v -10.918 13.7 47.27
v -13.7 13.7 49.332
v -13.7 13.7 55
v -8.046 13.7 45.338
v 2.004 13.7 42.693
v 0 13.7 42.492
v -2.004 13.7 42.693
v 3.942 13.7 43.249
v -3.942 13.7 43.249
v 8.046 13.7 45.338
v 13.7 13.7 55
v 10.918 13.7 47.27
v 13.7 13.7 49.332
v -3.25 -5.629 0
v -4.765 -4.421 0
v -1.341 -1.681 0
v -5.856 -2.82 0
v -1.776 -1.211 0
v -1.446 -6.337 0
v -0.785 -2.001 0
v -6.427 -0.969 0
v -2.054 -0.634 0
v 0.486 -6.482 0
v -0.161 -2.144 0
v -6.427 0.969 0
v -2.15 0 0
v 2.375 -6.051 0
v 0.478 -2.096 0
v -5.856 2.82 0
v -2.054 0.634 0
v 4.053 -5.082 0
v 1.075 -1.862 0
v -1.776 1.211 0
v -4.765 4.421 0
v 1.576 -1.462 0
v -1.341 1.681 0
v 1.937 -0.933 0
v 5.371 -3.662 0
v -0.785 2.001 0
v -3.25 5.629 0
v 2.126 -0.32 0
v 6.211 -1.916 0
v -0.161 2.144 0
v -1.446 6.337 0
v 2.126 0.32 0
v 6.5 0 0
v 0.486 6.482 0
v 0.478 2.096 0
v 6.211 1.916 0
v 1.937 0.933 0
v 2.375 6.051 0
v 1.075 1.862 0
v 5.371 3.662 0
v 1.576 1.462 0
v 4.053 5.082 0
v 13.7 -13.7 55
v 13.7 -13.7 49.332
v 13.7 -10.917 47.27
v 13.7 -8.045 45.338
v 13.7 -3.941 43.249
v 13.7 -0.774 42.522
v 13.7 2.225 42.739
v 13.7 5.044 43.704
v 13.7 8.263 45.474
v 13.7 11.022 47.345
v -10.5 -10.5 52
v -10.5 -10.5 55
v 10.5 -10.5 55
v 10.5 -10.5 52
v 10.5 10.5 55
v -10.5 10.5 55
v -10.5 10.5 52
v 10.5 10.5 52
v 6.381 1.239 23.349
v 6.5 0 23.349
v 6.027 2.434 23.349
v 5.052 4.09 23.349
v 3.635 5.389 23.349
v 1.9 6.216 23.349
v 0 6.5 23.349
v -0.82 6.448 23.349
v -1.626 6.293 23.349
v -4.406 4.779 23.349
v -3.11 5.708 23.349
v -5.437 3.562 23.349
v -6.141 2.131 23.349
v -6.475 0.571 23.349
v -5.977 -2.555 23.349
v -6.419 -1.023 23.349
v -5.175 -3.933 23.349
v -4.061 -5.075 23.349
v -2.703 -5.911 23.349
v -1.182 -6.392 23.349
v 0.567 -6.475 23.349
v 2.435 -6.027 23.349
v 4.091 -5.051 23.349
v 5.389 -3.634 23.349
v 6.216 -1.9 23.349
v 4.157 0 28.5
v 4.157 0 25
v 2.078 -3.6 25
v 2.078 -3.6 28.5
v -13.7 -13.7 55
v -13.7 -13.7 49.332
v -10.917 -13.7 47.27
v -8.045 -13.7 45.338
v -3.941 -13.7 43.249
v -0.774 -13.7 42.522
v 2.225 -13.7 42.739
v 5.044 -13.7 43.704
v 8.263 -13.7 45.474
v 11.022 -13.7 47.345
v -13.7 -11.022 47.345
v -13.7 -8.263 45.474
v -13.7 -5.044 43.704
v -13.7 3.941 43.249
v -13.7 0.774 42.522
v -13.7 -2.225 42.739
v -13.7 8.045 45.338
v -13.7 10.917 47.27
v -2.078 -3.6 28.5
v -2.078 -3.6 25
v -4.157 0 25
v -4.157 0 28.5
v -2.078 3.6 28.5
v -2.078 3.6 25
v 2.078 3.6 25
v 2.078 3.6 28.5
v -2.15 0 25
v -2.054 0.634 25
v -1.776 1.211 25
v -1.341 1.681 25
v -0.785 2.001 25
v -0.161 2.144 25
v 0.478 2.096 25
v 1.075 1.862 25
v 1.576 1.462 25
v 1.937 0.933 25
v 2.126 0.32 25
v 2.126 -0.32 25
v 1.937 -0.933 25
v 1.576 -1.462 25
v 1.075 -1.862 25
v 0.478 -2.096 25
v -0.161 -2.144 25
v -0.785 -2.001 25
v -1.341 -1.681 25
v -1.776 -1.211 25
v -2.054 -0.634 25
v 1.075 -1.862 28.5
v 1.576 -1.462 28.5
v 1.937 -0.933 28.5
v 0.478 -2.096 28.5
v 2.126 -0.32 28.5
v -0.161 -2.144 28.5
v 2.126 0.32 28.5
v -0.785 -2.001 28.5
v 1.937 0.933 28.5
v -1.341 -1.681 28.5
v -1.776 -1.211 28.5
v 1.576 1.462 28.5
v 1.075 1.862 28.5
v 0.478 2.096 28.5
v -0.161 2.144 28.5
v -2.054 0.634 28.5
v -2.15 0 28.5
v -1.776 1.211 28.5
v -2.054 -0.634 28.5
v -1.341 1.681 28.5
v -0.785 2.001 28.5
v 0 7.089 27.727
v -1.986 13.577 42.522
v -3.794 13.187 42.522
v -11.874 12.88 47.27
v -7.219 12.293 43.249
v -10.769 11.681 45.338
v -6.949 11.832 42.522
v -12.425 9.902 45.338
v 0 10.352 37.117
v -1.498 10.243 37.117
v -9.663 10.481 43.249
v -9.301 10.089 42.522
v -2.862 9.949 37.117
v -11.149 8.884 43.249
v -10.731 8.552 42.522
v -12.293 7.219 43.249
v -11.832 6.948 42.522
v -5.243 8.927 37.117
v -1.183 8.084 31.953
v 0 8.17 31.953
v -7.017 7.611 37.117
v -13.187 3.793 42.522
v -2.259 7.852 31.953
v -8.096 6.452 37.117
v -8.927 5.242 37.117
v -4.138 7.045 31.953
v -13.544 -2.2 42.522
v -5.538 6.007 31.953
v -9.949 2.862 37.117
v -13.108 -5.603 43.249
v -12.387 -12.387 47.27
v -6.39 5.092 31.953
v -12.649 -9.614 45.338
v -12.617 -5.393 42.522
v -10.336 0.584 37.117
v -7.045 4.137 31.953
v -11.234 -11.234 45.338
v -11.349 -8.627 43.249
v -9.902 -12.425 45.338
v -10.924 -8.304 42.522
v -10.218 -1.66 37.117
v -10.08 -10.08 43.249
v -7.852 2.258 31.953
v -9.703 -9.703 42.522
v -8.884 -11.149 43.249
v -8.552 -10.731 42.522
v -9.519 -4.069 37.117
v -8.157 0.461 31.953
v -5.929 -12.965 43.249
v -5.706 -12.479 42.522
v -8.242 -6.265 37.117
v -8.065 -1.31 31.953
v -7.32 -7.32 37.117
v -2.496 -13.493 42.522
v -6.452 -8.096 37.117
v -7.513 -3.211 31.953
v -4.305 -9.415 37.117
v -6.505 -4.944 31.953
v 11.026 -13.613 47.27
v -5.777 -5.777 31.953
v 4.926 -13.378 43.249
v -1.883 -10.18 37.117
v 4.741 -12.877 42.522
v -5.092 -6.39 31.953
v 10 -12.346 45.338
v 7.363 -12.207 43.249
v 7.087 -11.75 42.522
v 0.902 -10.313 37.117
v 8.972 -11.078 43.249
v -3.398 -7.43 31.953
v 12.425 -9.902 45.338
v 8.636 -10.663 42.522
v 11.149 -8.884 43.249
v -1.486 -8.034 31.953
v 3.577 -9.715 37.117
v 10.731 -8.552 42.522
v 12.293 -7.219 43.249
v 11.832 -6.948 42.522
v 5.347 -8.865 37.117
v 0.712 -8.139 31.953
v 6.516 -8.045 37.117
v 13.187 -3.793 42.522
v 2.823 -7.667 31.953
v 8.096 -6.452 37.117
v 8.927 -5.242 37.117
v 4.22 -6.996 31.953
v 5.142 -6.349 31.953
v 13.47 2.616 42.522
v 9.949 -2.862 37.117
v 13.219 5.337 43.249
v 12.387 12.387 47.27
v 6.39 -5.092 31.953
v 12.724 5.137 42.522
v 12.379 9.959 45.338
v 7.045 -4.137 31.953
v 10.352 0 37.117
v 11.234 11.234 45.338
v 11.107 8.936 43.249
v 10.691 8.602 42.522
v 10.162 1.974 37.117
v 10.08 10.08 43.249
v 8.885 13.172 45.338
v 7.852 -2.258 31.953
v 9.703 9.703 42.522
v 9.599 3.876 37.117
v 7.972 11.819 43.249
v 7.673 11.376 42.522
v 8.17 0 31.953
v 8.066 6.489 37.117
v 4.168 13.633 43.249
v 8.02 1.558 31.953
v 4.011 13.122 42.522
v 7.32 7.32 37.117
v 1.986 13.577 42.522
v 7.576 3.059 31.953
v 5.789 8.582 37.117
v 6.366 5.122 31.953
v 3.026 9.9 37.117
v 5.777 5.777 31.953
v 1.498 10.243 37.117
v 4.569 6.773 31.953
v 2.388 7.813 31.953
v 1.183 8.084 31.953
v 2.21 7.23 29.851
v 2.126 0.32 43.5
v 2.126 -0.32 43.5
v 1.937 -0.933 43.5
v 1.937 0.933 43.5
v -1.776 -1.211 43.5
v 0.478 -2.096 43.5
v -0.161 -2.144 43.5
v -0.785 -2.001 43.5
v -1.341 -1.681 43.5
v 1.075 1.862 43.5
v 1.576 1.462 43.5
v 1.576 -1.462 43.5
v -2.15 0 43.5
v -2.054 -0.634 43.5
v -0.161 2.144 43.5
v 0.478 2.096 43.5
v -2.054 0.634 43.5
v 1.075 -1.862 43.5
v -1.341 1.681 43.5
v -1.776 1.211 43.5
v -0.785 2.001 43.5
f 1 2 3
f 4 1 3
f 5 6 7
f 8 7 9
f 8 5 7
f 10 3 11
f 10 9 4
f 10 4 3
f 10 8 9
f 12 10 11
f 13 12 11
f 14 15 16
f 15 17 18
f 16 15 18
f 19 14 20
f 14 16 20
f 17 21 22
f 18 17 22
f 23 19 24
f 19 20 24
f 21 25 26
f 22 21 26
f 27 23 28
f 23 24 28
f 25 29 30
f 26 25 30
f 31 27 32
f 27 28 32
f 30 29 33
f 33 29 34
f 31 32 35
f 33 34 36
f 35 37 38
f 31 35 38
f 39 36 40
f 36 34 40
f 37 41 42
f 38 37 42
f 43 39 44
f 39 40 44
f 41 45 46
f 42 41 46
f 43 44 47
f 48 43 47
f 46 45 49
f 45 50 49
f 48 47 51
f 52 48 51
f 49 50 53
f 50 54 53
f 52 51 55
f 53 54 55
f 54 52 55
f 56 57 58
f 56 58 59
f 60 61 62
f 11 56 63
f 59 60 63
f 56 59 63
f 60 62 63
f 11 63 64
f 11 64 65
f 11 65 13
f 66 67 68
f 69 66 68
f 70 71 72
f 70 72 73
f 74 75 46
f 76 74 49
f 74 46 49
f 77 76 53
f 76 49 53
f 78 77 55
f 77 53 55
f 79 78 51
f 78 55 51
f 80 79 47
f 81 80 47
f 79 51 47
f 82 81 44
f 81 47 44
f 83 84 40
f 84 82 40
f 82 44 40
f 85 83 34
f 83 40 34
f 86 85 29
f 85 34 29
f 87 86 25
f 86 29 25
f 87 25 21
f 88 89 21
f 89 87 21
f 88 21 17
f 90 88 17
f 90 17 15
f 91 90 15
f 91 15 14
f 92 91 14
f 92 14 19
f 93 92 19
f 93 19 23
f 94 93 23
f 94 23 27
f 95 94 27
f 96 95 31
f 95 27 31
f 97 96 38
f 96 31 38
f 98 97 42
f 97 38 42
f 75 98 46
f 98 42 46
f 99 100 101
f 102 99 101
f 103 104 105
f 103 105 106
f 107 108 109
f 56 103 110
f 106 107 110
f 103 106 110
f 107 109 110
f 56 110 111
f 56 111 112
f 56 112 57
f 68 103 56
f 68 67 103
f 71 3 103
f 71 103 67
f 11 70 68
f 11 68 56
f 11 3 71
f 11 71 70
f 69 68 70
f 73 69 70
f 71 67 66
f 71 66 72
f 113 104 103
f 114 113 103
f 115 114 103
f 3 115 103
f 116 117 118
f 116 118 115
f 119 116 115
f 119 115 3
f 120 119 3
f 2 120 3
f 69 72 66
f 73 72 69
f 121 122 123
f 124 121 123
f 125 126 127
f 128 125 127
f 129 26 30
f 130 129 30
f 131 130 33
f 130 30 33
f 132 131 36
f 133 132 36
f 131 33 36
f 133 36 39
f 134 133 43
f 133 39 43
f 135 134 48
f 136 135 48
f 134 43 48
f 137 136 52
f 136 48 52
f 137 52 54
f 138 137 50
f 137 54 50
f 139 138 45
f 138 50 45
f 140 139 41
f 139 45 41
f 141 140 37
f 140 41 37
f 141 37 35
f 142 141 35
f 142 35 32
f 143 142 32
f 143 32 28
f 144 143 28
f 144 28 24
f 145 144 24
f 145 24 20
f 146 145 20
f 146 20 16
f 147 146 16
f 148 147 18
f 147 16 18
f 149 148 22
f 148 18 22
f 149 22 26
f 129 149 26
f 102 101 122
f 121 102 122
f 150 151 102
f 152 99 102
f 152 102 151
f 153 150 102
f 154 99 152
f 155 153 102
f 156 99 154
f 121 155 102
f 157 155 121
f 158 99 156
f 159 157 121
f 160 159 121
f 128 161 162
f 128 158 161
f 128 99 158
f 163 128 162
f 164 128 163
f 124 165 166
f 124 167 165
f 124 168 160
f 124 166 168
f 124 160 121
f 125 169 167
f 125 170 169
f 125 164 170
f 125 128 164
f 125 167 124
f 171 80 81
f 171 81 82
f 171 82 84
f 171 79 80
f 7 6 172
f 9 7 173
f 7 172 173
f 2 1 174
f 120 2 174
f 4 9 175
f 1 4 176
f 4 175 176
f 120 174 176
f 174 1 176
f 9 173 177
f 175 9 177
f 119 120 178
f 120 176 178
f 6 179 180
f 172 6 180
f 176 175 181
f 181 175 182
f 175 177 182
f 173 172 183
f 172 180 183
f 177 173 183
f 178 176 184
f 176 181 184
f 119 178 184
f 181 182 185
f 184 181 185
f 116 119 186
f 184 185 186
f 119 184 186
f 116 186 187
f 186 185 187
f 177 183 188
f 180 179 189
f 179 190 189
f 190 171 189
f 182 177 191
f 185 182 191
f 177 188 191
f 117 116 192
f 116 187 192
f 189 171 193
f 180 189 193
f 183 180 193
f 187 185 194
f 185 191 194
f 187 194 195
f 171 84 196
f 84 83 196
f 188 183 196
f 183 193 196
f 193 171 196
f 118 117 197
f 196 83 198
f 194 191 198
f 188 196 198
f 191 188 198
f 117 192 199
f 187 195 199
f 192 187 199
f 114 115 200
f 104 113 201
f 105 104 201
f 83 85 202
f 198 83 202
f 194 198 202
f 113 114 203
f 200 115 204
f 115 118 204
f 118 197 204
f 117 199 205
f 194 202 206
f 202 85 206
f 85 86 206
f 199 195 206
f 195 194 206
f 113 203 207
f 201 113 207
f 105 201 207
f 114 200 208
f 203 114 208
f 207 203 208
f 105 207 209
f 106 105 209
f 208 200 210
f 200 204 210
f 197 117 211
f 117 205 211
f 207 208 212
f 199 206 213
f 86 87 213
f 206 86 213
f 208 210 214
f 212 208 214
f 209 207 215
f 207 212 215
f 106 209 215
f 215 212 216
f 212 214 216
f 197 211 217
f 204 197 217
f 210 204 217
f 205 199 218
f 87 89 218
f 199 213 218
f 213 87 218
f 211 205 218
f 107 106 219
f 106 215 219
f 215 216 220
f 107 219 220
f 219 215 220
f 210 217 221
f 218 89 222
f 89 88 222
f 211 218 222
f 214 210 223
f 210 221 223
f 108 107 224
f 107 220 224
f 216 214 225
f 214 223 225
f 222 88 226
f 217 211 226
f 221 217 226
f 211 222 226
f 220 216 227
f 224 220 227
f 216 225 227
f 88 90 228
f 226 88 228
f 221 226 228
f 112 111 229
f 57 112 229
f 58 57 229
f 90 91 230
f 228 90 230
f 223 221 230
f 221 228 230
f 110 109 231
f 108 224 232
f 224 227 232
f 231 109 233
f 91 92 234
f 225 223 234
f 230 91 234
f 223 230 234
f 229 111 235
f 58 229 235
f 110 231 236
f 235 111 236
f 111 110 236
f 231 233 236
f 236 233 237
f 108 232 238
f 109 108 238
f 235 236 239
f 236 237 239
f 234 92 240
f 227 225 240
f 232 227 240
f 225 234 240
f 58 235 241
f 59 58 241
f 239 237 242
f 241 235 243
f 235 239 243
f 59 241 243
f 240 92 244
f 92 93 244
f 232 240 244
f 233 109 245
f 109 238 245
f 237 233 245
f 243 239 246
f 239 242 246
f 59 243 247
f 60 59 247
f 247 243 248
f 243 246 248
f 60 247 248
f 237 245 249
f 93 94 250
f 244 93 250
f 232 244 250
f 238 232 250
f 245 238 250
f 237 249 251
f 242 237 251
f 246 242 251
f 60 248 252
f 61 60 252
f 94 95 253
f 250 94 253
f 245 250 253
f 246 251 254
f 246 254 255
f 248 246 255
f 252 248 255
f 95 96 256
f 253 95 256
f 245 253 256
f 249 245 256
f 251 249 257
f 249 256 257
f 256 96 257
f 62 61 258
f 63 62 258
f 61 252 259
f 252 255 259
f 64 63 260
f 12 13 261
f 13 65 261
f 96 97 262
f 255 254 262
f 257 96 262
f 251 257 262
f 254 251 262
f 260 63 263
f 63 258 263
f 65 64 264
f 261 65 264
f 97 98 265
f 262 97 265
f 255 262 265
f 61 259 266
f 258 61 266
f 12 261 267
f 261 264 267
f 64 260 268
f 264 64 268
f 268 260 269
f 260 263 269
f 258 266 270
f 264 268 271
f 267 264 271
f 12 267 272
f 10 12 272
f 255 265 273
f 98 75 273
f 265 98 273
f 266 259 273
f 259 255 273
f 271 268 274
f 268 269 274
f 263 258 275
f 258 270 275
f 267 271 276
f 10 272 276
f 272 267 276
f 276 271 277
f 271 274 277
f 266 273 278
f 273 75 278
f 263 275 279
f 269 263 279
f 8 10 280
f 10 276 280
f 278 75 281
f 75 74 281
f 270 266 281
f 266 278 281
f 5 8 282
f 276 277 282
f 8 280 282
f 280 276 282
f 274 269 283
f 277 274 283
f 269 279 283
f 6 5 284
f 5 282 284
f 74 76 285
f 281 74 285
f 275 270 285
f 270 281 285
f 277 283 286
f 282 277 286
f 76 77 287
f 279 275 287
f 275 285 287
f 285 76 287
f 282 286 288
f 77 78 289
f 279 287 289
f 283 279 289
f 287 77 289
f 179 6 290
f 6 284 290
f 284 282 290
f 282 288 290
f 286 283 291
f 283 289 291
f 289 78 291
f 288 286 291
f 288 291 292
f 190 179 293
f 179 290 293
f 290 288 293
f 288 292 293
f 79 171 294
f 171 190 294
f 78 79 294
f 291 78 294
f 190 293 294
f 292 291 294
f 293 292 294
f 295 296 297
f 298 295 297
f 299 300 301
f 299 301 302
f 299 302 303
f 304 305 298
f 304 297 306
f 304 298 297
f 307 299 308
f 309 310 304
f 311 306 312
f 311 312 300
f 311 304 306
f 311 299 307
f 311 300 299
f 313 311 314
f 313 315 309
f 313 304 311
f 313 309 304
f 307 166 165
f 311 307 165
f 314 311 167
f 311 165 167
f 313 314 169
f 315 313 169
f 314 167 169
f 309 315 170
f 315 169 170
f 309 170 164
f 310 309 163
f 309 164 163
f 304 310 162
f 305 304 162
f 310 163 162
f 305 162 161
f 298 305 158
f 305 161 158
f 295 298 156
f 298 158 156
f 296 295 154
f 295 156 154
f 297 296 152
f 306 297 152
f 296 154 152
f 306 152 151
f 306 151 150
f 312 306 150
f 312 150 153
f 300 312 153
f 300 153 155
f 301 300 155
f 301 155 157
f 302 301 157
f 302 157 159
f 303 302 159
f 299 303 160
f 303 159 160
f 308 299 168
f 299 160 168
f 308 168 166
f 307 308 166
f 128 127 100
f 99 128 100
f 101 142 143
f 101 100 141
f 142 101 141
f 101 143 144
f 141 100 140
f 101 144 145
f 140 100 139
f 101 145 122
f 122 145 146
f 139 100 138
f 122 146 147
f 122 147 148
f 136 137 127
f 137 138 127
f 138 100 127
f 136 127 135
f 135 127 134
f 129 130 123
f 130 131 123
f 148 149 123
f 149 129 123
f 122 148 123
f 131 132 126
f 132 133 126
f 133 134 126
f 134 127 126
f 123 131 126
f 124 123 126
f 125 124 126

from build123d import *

# Parameters (mm, degrees)
SKETCH1_R           = 6.5
BOSS_EXTRUDE1_DEPTH = 50
SKETCH2_W           = 27.4
SKETCH2_H           = 27.4
BOSS_EXTRUDE2_DEPTH = 5
SKETCH3_W           = 21
SKETCH3_H           = 21
CUT_EXTRUDE1_DEPTH  = 3
SKETCH7_W           = 47.139349652
SKETCH7_H           = 47.139349652
SKETCH7_W_2         = 27.4
SKETCH7_H_2         = 27.4
CUT_EXTRUDE2_DEPTH  = 78
SKETCH8_R           = 2.15
CUT_EXTRUDE3_DEPTH  = 25
CUT_EXTRUDE4_DEPTH  = 3.5
SKETCH10_R          = 2.15
CUT_EXTRUDE5_DEPTH  = 15


with BuildPart() as part:
    # Sketch1 → Boss-Extrude1 (new body)
    with BuildSketch(Plane.XY):
        Circle(SKETCH1_R)
    extrude(amount=BOSS_EXTRUDE1_DEPTH)

    # Sketch2 → Boss-Extrude2 (add)
    with BuildSketch(Plane.XY.offset(50)):
        Rectangle(SKETCH2_W, SKETCH2_H)
    extrude(amount=BOSS_EXTRUDE2_DEPTH)

    # Sketch3 → Cut-Extrude1 (cut)
    with BuildSketch(Plane.XY.offset(55)):
        Rectangle(SKETCH3_W, SKETCH3_H)
    extrude(amount=-CUT_EXTRUDE1_DEPTH, mode=Mode.SUBTRACT)

    # Sketch6 → Revolve1 (revolve)
    with BuildSketch(Plane(origin=(0, 0, 0), x_dir=(0, 0, -1), z_dir=(1, 0, 0))):
        with BuildLine():
            Line((-50, 0), (-50, 20))
            add(Edge.make_bspline(
                [(-50, 20), (-32.330139343, 3.31447133), (-23.53449028, 6.5), (0, 6.5)],
                knots=[0, 0, 0, 0, 1, 1, 1, 1], degree=3))
            Line((0, 6.5), (0, 0))
            Line((0, 0), (-50, 0))
        make_face()
    revolve(axis=Axis((0, 0, 63.541170981), (0, 0, 1)))

    # Sketch7 → Cut-Extrude2 (cut)
    with BuildSketch(Plane.XY.offset(50)):
        Rectangle(SKETCH7_W, SKETCH7_H)
        Rectangle(SKETCH7_W_2, SKETCH7_H_2, mode=Mode.SUBTRACT)
    extrude(amount=-CUT_EXTRUDE2_DEPTH, mode=Mode.SUBTRACT)

    # Sketch8 → Cut-Extrude3 (cut)
    with BuildSketch(Plane(origin=(0, 0, 0), x_dir=(-1, 0, 0), z_dir=(0, 0, -1))):
        Circle(SKETCH8_R)
    extrude(amount=-CUT_EXTRUDE3_DEPTH, mode=Mode.SUBTRACT)

    # Sketch9 → Cut-Extrude4 (cut)
    with BuildSketch(Plane(origin=(0, 0, 25), x_dir=(-1, 0, 0), z_dir=(0, 0, -1))):
        Polygon((4.156921938, 0), (2.078460969, 3.6), (-2.078460969, 3.6), (-4.156921938, 0), (-2.078460969, -3.6), (2.078460969, -3.6), align=None)
    extrude(amount=-CUT_EXTRUDE4_DEPTH, mode=Mode.SUBTRACT)

    # Sketch10 → Cut-Extrude5 (cut)
    with BuildSketch(Plane(origin=(0, 0, 28.5), x_dir=(-1, 0, 0), z_dir=(0, 0, -1))):
        Circle(SKETCH10_R)
    extrude(amount=-CUT_EXTRUDE5_DEPTH, mode=Mode.SUBTRACT)


solid = part.part
